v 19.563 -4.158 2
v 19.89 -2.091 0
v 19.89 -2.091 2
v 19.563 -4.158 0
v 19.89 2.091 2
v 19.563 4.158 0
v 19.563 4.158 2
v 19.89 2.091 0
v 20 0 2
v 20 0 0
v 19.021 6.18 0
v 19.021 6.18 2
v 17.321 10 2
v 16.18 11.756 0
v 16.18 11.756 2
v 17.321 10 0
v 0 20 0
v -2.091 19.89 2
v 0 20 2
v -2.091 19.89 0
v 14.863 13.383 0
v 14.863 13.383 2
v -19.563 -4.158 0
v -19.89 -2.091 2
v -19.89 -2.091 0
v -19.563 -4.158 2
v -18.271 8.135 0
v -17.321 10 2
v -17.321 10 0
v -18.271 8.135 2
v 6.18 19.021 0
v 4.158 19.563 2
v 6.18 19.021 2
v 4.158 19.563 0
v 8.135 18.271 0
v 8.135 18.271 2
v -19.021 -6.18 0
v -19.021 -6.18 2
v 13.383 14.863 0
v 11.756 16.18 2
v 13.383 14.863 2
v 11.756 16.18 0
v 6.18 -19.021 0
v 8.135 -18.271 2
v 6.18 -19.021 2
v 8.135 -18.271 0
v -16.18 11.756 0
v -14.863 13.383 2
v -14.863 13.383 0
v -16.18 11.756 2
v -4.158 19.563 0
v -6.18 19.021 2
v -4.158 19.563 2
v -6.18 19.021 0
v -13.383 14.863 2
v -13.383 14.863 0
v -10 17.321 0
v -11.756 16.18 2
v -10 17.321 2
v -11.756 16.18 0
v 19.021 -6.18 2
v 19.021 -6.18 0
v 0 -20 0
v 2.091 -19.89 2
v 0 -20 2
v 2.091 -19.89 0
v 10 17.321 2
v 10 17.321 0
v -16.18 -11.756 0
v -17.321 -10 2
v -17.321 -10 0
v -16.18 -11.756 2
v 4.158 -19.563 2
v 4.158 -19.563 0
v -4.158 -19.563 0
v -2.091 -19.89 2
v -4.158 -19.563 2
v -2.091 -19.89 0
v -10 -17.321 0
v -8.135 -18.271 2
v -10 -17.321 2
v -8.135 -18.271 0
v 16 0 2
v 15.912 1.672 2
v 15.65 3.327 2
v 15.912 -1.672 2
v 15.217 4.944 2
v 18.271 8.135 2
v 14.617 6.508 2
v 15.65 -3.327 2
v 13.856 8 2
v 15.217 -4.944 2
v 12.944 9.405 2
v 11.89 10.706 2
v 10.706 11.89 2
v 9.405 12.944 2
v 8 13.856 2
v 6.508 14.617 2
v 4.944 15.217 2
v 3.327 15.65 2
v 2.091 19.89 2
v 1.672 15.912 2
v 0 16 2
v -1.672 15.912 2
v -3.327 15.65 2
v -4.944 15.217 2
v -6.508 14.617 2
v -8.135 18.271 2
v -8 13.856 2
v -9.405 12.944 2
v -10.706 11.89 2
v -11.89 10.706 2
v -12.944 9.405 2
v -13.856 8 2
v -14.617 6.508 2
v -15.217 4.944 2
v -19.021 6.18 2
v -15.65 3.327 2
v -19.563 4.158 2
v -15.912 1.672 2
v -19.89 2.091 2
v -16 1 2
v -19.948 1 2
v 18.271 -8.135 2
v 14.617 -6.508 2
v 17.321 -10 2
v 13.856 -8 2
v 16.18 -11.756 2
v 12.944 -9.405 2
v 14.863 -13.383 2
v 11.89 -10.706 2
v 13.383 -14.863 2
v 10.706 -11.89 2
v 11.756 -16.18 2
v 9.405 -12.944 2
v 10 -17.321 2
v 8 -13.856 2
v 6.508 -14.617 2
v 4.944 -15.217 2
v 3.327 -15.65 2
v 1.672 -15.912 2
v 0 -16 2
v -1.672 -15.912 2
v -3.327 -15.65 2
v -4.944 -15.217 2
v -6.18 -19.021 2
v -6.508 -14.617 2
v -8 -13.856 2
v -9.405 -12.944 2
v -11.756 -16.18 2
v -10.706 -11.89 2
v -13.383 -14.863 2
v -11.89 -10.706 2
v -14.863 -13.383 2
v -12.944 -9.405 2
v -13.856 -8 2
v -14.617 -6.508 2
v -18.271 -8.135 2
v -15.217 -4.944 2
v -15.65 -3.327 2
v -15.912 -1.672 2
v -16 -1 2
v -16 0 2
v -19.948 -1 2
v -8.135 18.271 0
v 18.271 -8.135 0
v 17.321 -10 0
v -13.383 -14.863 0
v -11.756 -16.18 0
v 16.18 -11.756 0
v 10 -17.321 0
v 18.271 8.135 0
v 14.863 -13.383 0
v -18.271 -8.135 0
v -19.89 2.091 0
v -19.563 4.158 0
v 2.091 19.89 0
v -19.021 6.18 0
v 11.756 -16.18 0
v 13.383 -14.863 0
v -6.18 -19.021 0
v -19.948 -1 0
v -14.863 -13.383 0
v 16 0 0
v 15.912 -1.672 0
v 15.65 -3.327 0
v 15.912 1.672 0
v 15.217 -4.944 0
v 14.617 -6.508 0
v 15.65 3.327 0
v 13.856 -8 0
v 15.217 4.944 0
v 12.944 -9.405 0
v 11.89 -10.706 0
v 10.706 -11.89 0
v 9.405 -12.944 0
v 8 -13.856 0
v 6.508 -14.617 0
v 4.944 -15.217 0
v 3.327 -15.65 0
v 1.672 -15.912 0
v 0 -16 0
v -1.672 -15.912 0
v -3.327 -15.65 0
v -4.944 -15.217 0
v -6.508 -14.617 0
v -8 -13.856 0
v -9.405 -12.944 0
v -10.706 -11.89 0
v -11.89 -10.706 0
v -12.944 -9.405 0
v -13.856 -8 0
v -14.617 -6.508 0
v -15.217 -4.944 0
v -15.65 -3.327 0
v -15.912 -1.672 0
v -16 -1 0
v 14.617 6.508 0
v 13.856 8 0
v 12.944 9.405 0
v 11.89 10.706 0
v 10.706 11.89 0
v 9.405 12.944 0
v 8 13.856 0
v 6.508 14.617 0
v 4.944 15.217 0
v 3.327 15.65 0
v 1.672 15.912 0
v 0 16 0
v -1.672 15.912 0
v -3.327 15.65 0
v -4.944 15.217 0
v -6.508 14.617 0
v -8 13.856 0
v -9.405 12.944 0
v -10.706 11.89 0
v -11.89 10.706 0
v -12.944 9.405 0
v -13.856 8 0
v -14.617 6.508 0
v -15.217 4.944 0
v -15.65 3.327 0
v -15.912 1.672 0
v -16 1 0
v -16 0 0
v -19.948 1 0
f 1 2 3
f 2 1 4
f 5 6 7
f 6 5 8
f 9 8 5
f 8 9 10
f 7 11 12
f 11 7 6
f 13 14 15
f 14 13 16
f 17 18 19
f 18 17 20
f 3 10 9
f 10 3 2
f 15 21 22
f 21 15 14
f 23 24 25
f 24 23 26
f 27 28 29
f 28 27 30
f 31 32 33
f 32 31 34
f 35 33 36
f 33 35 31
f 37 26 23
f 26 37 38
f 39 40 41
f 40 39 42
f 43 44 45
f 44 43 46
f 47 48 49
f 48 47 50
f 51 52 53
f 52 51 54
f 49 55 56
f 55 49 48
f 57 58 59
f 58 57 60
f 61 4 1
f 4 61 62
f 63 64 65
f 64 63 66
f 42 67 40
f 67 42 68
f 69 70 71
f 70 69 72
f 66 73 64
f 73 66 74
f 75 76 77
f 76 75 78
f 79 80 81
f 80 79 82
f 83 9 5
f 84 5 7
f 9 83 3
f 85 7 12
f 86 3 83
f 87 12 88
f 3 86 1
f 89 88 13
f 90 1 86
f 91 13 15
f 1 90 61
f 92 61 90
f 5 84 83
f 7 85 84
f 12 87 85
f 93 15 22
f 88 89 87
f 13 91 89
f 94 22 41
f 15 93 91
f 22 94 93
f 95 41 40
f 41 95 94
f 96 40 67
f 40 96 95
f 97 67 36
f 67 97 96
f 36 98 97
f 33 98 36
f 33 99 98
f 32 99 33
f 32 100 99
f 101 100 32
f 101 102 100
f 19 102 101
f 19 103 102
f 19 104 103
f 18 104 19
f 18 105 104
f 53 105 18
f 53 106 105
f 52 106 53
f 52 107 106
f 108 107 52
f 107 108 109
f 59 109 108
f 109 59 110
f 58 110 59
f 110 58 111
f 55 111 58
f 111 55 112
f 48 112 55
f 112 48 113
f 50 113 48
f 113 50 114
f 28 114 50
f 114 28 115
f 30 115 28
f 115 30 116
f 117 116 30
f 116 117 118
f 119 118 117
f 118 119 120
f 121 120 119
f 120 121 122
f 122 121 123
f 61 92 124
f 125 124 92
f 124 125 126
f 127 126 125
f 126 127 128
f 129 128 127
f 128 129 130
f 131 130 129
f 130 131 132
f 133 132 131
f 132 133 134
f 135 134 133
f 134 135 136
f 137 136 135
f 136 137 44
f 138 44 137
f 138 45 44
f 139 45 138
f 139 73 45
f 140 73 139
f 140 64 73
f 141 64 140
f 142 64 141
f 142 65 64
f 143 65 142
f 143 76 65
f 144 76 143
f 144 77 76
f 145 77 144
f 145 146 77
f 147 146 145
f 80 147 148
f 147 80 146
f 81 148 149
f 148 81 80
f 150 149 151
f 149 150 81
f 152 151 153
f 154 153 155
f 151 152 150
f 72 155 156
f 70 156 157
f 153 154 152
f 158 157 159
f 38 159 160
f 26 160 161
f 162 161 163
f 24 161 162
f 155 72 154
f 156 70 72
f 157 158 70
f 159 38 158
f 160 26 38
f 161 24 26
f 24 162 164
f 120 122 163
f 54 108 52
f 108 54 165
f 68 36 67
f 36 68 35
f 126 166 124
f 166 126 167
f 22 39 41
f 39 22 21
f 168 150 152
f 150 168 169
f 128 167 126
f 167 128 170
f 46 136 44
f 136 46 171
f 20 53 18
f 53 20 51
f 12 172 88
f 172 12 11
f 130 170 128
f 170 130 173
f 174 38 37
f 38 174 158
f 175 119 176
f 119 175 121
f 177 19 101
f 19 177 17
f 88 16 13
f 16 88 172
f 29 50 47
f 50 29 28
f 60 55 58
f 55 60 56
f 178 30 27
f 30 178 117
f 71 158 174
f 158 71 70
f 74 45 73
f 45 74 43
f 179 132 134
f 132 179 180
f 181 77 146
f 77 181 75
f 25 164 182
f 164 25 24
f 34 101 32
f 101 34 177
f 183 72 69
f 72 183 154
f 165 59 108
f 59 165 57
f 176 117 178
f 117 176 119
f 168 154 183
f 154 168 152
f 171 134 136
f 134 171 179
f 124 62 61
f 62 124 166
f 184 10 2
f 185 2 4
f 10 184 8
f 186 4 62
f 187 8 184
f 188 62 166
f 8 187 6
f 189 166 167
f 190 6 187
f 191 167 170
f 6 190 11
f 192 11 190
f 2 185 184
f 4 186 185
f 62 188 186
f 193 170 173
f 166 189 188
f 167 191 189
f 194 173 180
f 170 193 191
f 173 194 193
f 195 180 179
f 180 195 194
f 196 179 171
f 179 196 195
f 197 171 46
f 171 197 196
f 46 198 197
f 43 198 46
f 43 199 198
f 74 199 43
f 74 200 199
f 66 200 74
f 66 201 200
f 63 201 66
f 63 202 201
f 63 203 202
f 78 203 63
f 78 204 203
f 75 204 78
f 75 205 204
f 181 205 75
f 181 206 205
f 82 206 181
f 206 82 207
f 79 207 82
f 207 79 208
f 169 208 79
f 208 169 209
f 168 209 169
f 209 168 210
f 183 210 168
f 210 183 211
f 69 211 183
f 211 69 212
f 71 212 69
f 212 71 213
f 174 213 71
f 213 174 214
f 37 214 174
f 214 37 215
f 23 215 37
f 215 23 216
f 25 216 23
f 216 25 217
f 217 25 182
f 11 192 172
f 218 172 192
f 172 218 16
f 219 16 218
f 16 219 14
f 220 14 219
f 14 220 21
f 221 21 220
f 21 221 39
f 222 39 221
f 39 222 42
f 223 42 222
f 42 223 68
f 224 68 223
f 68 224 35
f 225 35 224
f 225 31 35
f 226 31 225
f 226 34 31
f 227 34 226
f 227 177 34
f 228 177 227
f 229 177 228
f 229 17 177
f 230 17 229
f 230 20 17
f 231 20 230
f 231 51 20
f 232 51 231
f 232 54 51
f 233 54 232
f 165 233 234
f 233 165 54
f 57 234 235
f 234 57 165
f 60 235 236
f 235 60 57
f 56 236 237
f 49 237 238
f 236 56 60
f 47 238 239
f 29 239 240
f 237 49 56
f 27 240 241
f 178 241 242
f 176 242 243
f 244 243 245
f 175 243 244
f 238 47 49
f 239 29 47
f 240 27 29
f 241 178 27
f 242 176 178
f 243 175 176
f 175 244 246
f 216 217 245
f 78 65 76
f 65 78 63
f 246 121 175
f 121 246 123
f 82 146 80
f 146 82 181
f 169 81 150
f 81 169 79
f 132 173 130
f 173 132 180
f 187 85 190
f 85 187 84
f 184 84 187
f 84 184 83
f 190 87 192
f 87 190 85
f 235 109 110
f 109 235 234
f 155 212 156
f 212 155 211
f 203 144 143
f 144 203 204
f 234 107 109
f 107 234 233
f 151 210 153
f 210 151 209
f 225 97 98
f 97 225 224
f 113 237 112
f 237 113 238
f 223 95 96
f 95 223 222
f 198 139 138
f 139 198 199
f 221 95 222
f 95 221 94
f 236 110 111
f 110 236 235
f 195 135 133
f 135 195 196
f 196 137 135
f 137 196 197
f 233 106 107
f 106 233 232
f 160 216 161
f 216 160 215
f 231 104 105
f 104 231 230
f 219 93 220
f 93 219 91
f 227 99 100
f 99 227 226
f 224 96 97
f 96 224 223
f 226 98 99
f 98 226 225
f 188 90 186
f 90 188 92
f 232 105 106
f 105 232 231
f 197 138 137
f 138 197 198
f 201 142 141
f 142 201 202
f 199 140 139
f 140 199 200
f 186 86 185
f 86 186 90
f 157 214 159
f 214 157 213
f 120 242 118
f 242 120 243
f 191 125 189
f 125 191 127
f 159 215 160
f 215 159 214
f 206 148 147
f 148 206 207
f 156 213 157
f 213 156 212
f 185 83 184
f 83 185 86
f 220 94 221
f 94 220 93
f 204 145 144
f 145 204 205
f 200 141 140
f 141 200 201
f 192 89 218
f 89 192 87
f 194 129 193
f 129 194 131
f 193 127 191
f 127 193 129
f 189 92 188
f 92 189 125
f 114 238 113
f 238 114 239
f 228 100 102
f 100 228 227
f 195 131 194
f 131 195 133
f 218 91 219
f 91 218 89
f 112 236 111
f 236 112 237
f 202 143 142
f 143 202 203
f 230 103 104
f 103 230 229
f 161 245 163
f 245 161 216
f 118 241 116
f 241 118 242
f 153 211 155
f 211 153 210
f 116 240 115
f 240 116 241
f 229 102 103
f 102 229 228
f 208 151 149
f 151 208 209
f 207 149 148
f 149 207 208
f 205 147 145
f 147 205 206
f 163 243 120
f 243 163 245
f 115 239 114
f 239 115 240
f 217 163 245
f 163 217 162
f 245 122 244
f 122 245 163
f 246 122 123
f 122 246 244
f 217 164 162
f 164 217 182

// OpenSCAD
// Internal retaining ring.
$fn = 60;
eps = 0.02;
inner_d = 32;
outer_d = 40;
thickness = max(2, 1.5);
difference() { cylinder(d=outer_d,h=thickness); translate([0,0,-eps]) cylinder(d=inner_d,h=thickness+2*eps); translate([-outer_d/2-eps,-1,-eps]) cube([outer_d/2-inner_d/2+eps,2,thickness+2*eps]); }
